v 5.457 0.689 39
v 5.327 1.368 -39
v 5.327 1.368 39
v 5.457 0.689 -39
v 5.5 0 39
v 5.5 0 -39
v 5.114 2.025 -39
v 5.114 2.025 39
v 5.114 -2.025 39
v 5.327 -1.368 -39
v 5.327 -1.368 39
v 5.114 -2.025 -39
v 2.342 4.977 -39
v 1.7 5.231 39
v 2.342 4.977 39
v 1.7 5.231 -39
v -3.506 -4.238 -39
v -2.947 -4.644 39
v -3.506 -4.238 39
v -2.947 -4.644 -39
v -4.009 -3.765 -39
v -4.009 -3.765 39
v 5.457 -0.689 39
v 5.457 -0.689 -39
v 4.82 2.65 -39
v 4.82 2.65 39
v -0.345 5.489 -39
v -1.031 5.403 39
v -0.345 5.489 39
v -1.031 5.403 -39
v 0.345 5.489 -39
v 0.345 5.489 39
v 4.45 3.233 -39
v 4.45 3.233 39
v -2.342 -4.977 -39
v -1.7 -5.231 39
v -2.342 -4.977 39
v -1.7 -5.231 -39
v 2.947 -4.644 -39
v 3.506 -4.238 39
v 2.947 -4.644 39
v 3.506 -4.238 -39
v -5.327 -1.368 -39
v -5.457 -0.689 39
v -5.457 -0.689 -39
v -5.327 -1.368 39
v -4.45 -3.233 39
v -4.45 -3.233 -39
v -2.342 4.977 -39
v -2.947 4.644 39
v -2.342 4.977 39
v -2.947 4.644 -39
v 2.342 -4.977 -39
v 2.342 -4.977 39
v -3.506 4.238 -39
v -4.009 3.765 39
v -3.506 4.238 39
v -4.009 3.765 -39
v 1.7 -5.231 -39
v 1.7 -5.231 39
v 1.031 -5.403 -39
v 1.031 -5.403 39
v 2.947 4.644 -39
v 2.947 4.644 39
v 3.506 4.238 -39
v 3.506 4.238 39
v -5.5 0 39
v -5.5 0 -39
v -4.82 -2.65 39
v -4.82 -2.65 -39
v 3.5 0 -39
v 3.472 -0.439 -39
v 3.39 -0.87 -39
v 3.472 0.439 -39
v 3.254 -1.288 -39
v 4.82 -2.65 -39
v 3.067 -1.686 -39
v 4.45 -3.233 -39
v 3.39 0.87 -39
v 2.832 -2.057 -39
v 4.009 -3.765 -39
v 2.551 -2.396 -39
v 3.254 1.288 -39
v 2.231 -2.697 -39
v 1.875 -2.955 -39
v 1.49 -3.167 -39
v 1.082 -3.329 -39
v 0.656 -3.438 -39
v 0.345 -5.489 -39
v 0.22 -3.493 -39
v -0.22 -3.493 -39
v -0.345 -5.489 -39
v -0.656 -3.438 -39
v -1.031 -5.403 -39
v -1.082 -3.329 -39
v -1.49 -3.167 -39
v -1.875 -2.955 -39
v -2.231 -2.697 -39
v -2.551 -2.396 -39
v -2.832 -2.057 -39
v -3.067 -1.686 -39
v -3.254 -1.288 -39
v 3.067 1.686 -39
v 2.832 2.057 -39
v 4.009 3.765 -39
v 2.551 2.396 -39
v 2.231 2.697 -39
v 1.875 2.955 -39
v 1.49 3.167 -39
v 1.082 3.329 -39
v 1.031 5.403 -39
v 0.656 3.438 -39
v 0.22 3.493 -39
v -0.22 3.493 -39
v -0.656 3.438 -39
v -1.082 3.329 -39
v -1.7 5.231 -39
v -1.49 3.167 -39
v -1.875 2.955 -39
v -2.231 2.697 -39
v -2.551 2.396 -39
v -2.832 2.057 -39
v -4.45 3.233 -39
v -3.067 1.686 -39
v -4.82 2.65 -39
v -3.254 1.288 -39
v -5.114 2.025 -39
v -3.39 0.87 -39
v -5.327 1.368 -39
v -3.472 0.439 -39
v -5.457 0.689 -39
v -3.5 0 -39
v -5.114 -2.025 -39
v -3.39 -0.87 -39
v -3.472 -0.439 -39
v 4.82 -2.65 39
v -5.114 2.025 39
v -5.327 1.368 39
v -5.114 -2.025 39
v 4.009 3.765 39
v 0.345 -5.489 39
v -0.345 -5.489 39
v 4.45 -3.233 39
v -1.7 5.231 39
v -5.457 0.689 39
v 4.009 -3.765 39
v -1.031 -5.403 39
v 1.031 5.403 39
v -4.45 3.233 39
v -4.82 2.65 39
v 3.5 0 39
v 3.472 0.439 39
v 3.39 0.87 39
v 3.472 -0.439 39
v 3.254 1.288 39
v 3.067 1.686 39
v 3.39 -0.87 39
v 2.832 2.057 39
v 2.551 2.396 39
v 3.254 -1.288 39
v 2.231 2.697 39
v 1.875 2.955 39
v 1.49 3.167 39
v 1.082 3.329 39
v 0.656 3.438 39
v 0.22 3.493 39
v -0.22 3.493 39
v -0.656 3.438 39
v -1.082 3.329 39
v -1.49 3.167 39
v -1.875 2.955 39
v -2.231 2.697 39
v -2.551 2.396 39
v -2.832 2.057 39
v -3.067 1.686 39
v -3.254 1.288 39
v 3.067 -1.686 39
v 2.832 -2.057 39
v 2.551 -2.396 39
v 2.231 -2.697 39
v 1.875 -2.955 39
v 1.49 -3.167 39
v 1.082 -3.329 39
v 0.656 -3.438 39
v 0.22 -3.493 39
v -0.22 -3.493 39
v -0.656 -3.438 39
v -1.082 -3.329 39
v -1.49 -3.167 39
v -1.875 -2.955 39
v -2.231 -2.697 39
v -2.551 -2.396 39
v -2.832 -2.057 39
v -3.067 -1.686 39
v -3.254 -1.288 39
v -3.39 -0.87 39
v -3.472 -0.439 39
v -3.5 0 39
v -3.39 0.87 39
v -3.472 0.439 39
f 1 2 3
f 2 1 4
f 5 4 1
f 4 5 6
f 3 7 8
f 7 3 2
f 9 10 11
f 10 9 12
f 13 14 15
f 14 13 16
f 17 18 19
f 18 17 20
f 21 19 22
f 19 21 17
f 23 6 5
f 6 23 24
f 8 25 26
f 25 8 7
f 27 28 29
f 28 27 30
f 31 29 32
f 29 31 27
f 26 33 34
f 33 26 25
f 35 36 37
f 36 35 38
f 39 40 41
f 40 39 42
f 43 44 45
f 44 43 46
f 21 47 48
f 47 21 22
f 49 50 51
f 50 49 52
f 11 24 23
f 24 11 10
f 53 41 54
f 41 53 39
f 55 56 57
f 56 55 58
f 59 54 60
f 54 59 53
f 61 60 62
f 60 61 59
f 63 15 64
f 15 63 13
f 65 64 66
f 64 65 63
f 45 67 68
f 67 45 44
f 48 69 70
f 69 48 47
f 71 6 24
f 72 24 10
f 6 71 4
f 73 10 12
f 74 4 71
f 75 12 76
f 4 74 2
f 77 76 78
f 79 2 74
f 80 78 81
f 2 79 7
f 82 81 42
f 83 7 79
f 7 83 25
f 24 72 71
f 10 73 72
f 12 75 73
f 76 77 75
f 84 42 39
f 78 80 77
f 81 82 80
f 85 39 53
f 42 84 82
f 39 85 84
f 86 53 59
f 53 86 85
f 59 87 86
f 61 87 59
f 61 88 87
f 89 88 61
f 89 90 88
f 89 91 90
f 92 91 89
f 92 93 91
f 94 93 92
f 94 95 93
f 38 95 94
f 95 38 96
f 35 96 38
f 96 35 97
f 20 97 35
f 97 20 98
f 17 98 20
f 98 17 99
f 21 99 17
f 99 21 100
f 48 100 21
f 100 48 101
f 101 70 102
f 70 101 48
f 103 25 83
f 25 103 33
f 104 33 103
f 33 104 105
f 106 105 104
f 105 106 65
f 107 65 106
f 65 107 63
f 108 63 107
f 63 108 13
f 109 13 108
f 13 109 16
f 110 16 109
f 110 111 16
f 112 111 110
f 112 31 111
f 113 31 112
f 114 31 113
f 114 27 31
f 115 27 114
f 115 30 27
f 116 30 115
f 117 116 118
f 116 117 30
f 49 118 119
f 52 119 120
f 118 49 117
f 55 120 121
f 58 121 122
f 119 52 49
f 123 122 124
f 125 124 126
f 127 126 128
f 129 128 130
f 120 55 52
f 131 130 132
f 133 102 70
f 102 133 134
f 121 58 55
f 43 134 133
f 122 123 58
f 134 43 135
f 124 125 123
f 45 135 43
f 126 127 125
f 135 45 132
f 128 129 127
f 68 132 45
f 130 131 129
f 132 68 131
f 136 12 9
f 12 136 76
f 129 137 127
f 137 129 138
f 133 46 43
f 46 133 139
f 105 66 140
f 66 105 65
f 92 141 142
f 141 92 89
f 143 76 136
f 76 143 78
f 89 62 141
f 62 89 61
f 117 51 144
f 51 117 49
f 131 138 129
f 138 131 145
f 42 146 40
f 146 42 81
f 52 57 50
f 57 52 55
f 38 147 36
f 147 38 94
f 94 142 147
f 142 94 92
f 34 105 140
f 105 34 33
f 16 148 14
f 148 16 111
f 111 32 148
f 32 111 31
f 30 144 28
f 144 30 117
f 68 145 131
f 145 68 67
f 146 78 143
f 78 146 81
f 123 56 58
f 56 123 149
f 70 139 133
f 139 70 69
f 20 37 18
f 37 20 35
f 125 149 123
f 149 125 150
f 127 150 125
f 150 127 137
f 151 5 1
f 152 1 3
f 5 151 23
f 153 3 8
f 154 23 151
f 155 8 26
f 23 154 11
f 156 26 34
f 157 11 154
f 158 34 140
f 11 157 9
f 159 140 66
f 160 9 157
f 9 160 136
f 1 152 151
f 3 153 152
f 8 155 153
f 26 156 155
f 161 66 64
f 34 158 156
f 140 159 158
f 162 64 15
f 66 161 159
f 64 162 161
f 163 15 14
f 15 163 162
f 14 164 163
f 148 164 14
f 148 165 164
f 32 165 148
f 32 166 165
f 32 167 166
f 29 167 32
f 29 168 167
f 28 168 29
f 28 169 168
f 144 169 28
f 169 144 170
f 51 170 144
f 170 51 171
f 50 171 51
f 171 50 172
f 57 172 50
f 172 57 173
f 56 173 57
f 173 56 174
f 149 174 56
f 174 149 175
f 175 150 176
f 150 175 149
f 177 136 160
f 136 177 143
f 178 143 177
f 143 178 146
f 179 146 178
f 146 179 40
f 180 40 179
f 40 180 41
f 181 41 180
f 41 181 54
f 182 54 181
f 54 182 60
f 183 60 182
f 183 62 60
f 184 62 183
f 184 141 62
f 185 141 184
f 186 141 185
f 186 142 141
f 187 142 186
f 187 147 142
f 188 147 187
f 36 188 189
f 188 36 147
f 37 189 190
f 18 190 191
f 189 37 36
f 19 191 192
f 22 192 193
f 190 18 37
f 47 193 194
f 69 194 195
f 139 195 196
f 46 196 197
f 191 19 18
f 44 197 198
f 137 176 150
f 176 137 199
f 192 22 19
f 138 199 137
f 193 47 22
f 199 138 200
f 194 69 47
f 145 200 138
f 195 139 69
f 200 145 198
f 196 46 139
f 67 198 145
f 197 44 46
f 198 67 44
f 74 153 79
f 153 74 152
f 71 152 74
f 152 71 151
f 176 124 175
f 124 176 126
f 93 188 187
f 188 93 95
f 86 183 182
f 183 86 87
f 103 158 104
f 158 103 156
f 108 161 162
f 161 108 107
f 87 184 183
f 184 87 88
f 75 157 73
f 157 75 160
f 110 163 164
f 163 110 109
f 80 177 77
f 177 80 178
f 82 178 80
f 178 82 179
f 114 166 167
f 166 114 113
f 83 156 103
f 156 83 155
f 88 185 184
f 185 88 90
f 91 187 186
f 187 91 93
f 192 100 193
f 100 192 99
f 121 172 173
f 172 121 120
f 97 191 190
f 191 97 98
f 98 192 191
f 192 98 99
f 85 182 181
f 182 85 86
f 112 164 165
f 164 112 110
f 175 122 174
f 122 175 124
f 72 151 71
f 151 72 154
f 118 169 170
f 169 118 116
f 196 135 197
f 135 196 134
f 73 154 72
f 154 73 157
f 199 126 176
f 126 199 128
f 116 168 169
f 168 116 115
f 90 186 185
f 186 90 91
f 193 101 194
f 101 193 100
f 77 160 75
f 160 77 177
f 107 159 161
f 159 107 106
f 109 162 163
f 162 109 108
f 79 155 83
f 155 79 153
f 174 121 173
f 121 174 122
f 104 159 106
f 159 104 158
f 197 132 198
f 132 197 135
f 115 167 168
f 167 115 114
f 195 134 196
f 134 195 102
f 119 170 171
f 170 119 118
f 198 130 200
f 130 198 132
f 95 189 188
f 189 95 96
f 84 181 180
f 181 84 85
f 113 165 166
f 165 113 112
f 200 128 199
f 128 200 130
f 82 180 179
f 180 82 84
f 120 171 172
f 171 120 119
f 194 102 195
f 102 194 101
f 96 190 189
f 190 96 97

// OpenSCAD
$fn = 50;


difference() {
	union() {
		translate(v = [0, 0, -39.0000000000]) {
			cylinder(h = 78, r = 5.5000000000);
		}
	}
	union() {
		translate(v = [0, 0, -100.0000000000]) {
			cylinder(h = 200, r = 3.5000000000);
		}
	}
}
